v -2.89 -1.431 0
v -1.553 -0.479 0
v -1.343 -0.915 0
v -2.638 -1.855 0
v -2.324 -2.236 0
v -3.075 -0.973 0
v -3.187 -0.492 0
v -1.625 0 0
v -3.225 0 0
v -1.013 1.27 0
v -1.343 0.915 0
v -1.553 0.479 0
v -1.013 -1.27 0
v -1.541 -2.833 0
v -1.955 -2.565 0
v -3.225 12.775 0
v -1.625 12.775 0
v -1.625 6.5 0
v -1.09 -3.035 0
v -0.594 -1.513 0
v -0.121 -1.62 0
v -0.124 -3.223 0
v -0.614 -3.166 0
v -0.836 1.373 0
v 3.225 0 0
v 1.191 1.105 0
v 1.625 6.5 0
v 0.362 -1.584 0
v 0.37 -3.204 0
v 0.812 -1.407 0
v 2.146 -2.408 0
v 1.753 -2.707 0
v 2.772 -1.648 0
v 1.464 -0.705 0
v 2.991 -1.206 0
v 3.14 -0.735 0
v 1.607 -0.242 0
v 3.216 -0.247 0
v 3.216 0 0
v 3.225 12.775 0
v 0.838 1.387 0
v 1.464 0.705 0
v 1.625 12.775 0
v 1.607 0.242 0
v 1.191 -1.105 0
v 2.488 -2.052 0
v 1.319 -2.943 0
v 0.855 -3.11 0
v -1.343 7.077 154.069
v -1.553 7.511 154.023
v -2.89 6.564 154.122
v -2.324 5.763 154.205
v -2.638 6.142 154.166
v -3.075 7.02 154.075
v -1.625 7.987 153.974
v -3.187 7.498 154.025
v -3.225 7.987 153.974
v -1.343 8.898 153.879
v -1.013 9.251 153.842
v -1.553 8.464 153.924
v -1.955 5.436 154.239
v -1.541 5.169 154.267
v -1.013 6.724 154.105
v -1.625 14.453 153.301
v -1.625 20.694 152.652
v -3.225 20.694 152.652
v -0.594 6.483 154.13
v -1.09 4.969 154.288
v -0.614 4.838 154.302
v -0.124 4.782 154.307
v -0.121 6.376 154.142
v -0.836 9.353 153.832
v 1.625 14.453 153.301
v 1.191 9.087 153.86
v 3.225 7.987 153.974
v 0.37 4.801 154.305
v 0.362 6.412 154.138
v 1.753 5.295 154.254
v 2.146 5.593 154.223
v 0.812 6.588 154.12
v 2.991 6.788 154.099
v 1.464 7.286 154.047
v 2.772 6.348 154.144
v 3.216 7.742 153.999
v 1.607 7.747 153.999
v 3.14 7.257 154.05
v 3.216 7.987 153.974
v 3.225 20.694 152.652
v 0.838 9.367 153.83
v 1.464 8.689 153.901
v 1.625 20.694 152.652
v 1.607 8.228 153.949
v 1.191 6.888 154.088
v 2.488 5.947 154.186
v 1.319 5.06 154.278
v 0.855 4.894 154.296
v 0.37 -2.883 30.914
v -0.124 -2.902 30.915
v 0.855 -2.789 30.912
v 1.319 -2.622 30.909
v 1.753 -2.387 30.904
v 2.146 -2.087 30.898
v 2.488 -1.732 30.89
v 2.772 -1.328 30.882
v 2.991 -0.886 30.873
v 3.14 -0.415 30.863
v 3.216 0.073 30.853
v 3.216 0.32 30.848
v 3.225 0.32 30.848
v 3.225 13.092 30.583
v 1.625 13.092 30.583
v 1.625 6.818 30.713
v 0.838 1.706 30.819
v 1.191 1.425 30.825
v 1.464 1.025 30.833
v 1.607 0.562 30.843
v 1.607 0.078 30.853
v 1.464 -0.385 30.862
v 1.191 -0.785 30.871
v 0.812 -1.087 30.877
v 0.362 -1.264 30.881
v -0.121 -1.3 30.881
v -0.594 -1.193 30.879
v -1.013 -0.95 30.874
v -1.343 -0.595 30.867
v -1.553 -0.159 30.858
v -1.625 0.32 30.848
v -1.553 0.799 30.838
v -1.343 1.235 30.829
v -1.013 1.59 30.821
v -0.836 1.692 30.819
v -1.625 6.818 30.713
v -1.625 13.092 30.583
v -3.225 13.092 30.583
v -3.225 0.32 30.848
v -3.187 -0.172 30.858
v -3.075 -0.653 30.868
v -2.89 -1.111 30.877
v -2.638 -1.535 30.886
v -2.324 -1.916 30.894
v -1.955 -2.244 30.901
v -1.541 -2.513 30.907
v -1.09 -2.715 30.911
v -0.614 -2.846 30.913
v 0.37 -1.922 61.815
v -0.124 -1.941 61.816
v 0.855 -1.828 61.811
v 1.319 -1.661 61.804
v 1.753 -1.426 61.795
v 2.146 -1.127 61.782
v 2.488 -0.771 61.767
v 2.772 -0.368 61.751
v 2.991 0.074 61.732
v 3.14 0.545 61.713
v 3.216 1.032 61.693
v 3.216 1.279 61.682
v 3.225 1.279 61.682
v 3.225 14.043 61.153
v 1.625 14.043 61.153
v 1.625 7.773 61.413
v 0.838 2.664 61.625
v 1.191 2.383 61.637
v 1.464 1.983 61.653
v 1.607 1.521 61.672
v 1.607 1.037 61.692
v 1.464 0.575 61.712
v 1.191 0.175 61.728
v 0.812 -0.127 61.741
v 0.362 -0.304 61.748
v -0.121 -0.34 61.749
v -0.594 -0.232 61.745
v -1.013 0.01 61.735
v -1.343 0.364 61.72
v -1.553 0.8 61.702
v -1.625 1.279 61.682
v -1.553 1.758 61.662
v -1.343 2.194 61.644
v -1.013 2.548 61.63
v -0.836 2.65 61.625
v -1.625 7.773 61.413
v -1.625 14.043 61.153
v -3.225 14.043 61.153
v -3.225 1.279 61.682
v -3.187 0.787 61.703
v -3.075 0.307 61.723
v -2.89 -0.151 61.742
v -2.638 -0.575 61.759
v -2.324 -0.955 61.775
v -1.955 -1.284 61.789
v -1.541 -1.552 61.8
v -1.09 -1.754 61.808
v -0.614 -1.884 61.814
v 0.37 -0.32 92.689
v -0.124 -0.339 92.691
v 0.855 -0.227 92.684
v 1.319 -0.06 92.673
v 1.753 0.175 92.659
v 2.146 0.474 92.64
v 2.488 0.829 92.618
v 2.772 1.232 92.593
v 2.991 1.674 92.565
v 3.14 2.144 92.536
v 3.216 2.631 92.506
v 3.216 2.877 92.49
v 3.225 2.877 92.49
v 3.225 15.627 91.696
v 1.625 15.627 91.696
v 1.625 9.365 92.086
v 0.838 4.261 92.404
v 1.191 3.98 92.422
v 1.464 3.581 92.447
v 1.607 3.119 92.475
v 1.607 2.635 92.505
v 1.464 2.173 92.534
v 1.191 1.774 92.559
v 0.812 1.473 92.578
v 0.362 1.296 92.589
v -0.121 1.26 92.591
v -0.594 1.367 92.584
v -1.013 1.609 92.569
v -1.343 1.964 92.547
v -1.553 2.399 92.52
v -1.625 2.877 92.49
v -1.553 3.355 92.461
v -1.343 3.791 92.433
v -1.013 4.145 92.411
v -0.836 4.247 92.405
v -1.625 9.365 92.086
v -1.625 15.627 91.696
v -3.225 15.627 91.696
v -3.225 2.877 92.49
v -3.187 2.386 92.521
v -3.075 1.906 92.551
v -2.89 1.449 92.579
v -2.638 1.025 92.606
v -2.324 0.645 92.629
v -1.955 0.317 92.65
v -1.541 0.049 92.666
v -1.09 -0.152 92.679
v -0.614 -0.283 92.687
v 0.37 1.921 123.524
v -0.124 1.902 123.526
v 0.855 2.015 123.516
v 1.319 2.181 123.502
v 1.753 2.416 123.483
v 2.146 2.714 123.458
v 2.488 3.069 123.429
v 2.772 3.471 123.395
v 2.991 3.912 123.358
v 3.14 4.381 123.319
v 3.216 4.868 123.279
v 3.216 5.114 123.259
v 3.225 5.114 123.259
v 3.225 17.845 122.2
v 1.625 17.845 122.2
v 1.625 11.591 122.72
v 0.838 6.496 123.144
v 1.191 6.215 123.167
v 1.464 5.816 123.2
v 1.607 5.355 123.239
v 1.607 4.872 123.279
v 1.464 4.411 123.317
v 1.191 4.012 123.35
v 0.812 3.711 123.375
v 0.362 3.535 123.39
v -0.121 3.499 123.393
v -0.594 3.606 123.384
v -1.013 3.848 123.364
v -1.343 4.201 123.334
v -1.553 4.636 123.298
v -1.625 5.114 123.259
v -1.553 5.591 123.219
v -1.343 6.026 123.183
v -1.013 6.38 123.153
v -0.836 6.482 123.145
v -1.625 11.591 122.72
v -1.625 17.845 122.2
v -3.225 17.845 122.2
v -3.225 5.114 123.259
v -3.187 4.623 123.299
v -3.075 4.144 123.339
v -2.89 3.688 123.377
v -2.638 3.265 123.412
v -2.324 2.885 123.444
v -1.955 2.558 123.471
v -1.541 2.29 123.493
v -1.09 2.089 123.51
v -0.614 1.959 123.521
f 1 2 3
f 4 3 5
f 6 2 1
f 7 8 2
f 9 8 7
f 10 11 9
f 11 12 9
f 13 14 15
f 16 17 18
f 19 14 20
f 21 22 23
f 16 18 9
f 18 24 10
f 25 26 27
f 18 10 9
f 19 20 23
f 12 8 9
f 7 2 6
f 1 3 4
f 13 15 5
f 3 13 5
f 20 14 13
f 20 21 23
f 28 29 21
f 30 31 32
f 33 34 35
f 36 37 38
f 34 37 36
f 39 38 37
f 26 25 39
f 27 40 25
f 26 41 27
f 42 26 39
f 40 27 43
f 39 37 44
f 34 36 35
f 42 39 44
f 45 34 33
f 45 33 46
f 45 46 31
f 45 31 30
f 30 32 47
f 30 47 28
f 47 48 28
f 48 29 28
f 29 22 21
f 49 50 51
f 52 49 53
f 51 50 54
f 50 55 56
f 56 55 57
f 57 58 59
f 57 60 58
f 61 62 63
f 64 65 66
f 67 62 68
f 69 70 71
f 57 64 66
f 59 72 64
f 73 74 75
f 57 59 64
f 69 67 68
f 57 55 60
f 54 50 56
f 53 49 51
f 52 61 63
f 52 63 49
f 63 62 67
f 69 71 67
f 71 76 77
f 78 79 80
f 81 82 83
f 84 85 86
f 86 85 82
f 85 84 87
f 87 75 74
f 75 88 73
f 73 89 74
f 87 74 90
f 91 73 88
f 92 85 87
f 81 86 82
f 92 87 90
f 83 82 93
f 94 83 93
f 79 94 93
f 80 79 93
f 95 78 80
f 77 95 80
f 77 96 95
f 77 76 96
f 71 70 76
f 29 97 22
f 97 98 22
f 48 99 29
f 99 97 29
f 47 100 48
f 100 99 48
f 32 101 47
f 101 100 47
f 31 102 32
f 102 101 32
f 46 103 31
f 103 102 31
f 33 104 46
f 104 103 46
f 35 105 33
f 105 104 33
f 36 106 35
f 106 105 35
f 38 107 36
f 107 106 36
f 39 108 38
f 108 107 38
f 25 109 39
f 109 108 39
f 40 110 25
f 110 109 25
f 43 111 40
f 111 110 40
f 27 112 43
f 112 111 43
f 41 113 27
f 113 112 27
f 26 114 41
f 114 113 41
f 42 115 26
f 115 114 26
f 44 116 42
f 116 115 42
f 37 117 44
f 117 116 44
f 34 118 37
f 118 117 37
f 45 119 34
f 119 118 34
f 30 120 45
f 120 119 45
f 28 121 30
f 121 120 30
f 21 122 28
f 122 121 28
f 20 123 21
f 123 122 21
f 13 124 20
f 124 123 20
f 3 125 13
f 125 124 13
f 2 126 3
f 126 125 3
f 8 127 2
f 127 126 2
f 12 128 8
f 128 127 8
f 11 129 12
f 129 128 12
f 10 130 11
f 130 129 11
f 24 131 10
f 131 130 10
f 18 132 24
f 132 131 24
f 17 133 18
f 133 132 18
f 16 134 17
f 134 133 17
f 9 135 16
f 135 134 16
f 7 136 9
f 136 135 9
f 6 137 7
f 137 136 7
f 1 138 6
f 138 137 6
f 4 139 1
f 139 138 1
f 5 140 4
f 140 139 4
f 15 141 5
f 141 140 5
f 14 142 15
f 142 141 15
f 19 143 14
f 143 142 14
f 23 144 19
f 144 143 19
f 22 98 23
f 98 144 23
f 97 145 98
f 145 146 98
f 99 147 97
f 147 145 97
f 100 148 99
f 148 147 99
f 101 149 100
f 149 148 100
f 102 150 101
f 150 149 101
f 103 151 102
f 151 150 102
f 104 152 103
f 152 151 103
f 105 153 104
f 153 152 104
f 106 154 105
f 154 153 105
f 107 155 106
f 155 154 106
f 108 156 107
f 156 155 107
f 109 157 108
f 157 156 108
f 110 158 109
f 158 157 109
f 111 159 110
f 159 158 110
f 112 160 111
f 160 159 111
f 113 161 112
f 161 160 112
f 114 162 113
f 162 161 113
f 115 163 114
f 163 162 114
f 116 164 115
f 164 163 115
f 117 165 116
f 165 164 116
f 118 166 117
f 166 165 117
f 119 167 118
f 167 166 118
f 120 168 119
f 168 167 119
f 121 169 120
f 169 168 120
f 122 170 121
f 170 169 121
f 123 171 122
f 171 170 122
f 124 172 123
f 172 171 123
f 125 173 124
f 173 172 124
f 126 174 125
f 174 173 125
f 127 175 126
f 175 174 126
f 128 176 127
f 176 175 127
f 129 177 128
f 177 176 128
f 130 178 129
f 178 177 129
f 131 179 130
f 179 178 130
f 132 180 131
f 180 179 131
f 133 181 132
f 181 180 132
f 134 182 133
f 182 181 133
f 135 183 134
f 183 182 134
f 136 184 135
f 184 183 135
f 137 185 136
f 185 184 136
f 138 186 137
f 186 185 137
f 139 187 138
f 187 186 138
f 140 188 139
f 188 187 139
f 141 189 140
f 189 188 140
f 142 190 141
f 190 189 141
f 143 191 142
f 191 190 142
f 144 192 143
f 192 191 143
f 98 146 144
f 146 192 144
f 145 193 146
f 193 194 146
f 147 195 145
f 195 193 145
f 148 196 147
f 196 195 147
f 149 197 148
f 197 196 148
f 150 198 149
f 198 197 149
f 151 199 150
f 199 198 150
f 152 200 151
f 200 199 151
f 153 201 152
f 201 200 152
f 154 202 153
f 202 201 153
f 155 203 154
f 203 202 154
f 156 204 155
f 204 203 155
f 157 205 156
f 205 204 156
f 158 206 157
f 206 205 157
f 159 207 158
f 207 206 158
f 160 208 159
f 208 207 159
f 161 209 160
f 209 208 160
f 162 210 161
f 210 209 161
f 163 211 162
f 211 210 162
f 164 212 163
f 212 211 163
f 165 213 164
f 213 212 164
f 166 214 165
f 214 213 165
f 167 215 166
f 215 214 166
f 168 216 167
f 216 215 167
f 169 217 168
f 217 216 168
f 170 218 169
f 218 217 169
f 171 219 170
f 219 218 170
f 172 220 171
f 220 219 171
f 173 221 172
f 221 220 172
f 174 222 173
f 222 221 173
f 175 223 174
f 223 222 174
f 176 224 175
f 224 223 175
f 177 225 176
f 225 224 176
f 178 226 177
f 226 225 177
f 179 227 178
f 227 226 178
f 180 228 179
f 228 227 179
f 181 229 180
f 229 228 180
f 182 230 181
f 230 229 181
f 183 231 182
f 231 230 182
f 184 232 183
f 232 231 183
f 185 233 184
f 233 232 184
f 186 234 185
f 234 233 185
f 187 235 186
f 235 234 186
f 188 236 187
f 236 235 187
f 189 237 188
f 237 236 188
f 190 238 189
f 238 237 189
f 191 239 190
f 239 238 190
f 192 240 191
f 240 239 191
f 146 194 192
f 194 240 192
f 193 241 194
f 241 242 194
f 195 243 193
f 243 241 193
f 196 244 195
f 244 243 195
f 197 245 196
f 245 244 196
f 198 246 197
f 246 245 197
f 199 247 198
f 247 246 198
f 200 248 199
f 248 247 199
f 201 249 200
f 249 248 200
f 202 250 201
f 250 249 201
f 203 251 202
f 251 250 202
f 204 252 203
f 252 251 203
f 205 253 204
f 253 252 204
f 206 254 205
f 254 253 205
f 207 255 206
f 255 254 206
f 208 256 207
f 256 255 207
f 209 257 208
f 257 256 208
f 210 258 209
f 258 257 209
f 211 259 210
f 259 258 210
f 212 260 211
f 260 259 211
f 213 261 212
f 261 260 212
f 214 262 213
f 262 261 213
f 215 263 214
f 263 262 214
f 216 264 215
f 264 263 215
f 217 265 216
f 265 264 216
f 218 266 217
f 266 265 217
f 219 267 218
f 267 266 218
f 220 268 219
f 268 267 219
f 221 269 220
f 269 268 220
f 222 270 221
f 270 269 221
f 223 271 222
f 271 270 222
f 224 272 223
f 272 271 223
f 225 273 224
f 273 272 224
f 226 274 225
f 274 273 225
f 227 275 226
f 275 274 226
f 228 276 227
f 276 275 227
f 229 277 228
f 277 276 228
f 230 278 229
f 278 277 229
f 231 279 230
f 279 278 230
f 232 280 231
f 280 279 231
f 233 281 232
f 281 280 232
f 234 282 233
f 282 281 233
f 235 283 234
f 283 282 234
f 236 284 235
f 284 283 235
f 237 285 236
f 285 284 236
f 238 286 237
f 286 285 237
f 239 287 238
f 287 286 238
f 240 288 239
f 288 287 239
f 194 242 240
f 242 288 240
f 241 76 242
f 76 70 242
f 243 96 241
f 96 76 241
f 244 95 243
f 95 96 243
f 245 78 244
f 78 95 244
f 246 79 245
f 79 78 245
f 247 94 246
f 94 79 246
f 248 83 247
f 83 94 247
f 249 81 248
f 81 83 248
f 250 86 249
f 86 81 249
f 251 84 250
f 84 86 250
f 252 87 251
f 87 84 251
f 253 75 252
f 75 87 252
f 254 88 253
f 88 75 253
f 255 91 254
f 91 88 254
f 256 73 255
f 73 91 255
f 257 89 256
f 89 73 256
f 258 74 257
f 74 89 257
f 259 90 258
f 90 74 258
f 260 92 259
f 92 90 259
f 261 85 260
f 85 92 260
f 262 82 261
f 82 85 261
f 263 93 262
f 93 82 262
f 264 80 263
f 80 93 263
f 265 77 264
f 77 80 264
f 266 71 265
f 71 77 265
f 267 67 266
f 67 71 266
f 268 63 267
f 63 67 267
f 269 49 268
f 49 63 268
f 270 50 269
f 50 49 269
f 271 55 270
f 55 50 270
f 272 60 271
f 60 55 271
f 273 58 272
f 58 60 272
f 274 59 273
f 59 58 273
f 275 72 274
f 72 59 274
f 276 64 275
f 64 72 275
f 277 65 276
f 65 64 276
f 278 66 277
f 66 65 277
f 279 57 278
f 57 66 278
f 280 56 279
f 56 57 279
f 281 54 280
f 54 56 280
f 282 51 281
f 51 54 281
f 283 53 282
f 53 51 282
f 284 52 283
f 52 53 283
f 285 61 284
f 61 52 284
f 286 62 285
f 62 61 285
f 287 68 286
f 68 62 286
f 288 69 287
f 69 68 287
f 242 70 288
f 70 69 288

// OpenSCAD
$fa = 1;
$fs = 0.5;

knife_t = 3.25;
knife_cord = 154.25;
knife_arc_h = 2;
knife_r = (pow(knife_cord, 2) / (8 * knife_arc_h)) + knife_arc_h / 2;
knife_a = (knife_cord/knife_r) * 180 / PI;
knife_bevel_l = 6.5;
protector_wall_t = 1.6;
protector_h = 16;
protector_t = protector_wall_t * 2 + knife_t;
protector_flat_h = protector_h - protector_t/2;

module profile() {
	difference() {
		union() {
			circle(d = protector_t);
			translate([0,protector_flat_h/2,0]) square([protector_t, protector_flat_h], center= true);
		}
		union() {
			projection() rotate([-90,0,0]) cylinder(r2=knife_t/2, r1=knife_t/2 - 1, h = knife_bevel_l, $fn=32);
			circle(d = knife_t);
			translate([-knife_t / 2, knife_bevel_l ,0]) square(size = [knife_t, protector_flat_h - knife_bevel_l], center = false);
		}
	}
}
module protector(){
	rotate([90,0,-90])
		translate([-knife_r,0,0])
		rotate_extrude(angle = knife_a, convexity = 2)
		translate([knife_r,0,0])
		rotate([0,0,90])
		profile();
}

protector();
